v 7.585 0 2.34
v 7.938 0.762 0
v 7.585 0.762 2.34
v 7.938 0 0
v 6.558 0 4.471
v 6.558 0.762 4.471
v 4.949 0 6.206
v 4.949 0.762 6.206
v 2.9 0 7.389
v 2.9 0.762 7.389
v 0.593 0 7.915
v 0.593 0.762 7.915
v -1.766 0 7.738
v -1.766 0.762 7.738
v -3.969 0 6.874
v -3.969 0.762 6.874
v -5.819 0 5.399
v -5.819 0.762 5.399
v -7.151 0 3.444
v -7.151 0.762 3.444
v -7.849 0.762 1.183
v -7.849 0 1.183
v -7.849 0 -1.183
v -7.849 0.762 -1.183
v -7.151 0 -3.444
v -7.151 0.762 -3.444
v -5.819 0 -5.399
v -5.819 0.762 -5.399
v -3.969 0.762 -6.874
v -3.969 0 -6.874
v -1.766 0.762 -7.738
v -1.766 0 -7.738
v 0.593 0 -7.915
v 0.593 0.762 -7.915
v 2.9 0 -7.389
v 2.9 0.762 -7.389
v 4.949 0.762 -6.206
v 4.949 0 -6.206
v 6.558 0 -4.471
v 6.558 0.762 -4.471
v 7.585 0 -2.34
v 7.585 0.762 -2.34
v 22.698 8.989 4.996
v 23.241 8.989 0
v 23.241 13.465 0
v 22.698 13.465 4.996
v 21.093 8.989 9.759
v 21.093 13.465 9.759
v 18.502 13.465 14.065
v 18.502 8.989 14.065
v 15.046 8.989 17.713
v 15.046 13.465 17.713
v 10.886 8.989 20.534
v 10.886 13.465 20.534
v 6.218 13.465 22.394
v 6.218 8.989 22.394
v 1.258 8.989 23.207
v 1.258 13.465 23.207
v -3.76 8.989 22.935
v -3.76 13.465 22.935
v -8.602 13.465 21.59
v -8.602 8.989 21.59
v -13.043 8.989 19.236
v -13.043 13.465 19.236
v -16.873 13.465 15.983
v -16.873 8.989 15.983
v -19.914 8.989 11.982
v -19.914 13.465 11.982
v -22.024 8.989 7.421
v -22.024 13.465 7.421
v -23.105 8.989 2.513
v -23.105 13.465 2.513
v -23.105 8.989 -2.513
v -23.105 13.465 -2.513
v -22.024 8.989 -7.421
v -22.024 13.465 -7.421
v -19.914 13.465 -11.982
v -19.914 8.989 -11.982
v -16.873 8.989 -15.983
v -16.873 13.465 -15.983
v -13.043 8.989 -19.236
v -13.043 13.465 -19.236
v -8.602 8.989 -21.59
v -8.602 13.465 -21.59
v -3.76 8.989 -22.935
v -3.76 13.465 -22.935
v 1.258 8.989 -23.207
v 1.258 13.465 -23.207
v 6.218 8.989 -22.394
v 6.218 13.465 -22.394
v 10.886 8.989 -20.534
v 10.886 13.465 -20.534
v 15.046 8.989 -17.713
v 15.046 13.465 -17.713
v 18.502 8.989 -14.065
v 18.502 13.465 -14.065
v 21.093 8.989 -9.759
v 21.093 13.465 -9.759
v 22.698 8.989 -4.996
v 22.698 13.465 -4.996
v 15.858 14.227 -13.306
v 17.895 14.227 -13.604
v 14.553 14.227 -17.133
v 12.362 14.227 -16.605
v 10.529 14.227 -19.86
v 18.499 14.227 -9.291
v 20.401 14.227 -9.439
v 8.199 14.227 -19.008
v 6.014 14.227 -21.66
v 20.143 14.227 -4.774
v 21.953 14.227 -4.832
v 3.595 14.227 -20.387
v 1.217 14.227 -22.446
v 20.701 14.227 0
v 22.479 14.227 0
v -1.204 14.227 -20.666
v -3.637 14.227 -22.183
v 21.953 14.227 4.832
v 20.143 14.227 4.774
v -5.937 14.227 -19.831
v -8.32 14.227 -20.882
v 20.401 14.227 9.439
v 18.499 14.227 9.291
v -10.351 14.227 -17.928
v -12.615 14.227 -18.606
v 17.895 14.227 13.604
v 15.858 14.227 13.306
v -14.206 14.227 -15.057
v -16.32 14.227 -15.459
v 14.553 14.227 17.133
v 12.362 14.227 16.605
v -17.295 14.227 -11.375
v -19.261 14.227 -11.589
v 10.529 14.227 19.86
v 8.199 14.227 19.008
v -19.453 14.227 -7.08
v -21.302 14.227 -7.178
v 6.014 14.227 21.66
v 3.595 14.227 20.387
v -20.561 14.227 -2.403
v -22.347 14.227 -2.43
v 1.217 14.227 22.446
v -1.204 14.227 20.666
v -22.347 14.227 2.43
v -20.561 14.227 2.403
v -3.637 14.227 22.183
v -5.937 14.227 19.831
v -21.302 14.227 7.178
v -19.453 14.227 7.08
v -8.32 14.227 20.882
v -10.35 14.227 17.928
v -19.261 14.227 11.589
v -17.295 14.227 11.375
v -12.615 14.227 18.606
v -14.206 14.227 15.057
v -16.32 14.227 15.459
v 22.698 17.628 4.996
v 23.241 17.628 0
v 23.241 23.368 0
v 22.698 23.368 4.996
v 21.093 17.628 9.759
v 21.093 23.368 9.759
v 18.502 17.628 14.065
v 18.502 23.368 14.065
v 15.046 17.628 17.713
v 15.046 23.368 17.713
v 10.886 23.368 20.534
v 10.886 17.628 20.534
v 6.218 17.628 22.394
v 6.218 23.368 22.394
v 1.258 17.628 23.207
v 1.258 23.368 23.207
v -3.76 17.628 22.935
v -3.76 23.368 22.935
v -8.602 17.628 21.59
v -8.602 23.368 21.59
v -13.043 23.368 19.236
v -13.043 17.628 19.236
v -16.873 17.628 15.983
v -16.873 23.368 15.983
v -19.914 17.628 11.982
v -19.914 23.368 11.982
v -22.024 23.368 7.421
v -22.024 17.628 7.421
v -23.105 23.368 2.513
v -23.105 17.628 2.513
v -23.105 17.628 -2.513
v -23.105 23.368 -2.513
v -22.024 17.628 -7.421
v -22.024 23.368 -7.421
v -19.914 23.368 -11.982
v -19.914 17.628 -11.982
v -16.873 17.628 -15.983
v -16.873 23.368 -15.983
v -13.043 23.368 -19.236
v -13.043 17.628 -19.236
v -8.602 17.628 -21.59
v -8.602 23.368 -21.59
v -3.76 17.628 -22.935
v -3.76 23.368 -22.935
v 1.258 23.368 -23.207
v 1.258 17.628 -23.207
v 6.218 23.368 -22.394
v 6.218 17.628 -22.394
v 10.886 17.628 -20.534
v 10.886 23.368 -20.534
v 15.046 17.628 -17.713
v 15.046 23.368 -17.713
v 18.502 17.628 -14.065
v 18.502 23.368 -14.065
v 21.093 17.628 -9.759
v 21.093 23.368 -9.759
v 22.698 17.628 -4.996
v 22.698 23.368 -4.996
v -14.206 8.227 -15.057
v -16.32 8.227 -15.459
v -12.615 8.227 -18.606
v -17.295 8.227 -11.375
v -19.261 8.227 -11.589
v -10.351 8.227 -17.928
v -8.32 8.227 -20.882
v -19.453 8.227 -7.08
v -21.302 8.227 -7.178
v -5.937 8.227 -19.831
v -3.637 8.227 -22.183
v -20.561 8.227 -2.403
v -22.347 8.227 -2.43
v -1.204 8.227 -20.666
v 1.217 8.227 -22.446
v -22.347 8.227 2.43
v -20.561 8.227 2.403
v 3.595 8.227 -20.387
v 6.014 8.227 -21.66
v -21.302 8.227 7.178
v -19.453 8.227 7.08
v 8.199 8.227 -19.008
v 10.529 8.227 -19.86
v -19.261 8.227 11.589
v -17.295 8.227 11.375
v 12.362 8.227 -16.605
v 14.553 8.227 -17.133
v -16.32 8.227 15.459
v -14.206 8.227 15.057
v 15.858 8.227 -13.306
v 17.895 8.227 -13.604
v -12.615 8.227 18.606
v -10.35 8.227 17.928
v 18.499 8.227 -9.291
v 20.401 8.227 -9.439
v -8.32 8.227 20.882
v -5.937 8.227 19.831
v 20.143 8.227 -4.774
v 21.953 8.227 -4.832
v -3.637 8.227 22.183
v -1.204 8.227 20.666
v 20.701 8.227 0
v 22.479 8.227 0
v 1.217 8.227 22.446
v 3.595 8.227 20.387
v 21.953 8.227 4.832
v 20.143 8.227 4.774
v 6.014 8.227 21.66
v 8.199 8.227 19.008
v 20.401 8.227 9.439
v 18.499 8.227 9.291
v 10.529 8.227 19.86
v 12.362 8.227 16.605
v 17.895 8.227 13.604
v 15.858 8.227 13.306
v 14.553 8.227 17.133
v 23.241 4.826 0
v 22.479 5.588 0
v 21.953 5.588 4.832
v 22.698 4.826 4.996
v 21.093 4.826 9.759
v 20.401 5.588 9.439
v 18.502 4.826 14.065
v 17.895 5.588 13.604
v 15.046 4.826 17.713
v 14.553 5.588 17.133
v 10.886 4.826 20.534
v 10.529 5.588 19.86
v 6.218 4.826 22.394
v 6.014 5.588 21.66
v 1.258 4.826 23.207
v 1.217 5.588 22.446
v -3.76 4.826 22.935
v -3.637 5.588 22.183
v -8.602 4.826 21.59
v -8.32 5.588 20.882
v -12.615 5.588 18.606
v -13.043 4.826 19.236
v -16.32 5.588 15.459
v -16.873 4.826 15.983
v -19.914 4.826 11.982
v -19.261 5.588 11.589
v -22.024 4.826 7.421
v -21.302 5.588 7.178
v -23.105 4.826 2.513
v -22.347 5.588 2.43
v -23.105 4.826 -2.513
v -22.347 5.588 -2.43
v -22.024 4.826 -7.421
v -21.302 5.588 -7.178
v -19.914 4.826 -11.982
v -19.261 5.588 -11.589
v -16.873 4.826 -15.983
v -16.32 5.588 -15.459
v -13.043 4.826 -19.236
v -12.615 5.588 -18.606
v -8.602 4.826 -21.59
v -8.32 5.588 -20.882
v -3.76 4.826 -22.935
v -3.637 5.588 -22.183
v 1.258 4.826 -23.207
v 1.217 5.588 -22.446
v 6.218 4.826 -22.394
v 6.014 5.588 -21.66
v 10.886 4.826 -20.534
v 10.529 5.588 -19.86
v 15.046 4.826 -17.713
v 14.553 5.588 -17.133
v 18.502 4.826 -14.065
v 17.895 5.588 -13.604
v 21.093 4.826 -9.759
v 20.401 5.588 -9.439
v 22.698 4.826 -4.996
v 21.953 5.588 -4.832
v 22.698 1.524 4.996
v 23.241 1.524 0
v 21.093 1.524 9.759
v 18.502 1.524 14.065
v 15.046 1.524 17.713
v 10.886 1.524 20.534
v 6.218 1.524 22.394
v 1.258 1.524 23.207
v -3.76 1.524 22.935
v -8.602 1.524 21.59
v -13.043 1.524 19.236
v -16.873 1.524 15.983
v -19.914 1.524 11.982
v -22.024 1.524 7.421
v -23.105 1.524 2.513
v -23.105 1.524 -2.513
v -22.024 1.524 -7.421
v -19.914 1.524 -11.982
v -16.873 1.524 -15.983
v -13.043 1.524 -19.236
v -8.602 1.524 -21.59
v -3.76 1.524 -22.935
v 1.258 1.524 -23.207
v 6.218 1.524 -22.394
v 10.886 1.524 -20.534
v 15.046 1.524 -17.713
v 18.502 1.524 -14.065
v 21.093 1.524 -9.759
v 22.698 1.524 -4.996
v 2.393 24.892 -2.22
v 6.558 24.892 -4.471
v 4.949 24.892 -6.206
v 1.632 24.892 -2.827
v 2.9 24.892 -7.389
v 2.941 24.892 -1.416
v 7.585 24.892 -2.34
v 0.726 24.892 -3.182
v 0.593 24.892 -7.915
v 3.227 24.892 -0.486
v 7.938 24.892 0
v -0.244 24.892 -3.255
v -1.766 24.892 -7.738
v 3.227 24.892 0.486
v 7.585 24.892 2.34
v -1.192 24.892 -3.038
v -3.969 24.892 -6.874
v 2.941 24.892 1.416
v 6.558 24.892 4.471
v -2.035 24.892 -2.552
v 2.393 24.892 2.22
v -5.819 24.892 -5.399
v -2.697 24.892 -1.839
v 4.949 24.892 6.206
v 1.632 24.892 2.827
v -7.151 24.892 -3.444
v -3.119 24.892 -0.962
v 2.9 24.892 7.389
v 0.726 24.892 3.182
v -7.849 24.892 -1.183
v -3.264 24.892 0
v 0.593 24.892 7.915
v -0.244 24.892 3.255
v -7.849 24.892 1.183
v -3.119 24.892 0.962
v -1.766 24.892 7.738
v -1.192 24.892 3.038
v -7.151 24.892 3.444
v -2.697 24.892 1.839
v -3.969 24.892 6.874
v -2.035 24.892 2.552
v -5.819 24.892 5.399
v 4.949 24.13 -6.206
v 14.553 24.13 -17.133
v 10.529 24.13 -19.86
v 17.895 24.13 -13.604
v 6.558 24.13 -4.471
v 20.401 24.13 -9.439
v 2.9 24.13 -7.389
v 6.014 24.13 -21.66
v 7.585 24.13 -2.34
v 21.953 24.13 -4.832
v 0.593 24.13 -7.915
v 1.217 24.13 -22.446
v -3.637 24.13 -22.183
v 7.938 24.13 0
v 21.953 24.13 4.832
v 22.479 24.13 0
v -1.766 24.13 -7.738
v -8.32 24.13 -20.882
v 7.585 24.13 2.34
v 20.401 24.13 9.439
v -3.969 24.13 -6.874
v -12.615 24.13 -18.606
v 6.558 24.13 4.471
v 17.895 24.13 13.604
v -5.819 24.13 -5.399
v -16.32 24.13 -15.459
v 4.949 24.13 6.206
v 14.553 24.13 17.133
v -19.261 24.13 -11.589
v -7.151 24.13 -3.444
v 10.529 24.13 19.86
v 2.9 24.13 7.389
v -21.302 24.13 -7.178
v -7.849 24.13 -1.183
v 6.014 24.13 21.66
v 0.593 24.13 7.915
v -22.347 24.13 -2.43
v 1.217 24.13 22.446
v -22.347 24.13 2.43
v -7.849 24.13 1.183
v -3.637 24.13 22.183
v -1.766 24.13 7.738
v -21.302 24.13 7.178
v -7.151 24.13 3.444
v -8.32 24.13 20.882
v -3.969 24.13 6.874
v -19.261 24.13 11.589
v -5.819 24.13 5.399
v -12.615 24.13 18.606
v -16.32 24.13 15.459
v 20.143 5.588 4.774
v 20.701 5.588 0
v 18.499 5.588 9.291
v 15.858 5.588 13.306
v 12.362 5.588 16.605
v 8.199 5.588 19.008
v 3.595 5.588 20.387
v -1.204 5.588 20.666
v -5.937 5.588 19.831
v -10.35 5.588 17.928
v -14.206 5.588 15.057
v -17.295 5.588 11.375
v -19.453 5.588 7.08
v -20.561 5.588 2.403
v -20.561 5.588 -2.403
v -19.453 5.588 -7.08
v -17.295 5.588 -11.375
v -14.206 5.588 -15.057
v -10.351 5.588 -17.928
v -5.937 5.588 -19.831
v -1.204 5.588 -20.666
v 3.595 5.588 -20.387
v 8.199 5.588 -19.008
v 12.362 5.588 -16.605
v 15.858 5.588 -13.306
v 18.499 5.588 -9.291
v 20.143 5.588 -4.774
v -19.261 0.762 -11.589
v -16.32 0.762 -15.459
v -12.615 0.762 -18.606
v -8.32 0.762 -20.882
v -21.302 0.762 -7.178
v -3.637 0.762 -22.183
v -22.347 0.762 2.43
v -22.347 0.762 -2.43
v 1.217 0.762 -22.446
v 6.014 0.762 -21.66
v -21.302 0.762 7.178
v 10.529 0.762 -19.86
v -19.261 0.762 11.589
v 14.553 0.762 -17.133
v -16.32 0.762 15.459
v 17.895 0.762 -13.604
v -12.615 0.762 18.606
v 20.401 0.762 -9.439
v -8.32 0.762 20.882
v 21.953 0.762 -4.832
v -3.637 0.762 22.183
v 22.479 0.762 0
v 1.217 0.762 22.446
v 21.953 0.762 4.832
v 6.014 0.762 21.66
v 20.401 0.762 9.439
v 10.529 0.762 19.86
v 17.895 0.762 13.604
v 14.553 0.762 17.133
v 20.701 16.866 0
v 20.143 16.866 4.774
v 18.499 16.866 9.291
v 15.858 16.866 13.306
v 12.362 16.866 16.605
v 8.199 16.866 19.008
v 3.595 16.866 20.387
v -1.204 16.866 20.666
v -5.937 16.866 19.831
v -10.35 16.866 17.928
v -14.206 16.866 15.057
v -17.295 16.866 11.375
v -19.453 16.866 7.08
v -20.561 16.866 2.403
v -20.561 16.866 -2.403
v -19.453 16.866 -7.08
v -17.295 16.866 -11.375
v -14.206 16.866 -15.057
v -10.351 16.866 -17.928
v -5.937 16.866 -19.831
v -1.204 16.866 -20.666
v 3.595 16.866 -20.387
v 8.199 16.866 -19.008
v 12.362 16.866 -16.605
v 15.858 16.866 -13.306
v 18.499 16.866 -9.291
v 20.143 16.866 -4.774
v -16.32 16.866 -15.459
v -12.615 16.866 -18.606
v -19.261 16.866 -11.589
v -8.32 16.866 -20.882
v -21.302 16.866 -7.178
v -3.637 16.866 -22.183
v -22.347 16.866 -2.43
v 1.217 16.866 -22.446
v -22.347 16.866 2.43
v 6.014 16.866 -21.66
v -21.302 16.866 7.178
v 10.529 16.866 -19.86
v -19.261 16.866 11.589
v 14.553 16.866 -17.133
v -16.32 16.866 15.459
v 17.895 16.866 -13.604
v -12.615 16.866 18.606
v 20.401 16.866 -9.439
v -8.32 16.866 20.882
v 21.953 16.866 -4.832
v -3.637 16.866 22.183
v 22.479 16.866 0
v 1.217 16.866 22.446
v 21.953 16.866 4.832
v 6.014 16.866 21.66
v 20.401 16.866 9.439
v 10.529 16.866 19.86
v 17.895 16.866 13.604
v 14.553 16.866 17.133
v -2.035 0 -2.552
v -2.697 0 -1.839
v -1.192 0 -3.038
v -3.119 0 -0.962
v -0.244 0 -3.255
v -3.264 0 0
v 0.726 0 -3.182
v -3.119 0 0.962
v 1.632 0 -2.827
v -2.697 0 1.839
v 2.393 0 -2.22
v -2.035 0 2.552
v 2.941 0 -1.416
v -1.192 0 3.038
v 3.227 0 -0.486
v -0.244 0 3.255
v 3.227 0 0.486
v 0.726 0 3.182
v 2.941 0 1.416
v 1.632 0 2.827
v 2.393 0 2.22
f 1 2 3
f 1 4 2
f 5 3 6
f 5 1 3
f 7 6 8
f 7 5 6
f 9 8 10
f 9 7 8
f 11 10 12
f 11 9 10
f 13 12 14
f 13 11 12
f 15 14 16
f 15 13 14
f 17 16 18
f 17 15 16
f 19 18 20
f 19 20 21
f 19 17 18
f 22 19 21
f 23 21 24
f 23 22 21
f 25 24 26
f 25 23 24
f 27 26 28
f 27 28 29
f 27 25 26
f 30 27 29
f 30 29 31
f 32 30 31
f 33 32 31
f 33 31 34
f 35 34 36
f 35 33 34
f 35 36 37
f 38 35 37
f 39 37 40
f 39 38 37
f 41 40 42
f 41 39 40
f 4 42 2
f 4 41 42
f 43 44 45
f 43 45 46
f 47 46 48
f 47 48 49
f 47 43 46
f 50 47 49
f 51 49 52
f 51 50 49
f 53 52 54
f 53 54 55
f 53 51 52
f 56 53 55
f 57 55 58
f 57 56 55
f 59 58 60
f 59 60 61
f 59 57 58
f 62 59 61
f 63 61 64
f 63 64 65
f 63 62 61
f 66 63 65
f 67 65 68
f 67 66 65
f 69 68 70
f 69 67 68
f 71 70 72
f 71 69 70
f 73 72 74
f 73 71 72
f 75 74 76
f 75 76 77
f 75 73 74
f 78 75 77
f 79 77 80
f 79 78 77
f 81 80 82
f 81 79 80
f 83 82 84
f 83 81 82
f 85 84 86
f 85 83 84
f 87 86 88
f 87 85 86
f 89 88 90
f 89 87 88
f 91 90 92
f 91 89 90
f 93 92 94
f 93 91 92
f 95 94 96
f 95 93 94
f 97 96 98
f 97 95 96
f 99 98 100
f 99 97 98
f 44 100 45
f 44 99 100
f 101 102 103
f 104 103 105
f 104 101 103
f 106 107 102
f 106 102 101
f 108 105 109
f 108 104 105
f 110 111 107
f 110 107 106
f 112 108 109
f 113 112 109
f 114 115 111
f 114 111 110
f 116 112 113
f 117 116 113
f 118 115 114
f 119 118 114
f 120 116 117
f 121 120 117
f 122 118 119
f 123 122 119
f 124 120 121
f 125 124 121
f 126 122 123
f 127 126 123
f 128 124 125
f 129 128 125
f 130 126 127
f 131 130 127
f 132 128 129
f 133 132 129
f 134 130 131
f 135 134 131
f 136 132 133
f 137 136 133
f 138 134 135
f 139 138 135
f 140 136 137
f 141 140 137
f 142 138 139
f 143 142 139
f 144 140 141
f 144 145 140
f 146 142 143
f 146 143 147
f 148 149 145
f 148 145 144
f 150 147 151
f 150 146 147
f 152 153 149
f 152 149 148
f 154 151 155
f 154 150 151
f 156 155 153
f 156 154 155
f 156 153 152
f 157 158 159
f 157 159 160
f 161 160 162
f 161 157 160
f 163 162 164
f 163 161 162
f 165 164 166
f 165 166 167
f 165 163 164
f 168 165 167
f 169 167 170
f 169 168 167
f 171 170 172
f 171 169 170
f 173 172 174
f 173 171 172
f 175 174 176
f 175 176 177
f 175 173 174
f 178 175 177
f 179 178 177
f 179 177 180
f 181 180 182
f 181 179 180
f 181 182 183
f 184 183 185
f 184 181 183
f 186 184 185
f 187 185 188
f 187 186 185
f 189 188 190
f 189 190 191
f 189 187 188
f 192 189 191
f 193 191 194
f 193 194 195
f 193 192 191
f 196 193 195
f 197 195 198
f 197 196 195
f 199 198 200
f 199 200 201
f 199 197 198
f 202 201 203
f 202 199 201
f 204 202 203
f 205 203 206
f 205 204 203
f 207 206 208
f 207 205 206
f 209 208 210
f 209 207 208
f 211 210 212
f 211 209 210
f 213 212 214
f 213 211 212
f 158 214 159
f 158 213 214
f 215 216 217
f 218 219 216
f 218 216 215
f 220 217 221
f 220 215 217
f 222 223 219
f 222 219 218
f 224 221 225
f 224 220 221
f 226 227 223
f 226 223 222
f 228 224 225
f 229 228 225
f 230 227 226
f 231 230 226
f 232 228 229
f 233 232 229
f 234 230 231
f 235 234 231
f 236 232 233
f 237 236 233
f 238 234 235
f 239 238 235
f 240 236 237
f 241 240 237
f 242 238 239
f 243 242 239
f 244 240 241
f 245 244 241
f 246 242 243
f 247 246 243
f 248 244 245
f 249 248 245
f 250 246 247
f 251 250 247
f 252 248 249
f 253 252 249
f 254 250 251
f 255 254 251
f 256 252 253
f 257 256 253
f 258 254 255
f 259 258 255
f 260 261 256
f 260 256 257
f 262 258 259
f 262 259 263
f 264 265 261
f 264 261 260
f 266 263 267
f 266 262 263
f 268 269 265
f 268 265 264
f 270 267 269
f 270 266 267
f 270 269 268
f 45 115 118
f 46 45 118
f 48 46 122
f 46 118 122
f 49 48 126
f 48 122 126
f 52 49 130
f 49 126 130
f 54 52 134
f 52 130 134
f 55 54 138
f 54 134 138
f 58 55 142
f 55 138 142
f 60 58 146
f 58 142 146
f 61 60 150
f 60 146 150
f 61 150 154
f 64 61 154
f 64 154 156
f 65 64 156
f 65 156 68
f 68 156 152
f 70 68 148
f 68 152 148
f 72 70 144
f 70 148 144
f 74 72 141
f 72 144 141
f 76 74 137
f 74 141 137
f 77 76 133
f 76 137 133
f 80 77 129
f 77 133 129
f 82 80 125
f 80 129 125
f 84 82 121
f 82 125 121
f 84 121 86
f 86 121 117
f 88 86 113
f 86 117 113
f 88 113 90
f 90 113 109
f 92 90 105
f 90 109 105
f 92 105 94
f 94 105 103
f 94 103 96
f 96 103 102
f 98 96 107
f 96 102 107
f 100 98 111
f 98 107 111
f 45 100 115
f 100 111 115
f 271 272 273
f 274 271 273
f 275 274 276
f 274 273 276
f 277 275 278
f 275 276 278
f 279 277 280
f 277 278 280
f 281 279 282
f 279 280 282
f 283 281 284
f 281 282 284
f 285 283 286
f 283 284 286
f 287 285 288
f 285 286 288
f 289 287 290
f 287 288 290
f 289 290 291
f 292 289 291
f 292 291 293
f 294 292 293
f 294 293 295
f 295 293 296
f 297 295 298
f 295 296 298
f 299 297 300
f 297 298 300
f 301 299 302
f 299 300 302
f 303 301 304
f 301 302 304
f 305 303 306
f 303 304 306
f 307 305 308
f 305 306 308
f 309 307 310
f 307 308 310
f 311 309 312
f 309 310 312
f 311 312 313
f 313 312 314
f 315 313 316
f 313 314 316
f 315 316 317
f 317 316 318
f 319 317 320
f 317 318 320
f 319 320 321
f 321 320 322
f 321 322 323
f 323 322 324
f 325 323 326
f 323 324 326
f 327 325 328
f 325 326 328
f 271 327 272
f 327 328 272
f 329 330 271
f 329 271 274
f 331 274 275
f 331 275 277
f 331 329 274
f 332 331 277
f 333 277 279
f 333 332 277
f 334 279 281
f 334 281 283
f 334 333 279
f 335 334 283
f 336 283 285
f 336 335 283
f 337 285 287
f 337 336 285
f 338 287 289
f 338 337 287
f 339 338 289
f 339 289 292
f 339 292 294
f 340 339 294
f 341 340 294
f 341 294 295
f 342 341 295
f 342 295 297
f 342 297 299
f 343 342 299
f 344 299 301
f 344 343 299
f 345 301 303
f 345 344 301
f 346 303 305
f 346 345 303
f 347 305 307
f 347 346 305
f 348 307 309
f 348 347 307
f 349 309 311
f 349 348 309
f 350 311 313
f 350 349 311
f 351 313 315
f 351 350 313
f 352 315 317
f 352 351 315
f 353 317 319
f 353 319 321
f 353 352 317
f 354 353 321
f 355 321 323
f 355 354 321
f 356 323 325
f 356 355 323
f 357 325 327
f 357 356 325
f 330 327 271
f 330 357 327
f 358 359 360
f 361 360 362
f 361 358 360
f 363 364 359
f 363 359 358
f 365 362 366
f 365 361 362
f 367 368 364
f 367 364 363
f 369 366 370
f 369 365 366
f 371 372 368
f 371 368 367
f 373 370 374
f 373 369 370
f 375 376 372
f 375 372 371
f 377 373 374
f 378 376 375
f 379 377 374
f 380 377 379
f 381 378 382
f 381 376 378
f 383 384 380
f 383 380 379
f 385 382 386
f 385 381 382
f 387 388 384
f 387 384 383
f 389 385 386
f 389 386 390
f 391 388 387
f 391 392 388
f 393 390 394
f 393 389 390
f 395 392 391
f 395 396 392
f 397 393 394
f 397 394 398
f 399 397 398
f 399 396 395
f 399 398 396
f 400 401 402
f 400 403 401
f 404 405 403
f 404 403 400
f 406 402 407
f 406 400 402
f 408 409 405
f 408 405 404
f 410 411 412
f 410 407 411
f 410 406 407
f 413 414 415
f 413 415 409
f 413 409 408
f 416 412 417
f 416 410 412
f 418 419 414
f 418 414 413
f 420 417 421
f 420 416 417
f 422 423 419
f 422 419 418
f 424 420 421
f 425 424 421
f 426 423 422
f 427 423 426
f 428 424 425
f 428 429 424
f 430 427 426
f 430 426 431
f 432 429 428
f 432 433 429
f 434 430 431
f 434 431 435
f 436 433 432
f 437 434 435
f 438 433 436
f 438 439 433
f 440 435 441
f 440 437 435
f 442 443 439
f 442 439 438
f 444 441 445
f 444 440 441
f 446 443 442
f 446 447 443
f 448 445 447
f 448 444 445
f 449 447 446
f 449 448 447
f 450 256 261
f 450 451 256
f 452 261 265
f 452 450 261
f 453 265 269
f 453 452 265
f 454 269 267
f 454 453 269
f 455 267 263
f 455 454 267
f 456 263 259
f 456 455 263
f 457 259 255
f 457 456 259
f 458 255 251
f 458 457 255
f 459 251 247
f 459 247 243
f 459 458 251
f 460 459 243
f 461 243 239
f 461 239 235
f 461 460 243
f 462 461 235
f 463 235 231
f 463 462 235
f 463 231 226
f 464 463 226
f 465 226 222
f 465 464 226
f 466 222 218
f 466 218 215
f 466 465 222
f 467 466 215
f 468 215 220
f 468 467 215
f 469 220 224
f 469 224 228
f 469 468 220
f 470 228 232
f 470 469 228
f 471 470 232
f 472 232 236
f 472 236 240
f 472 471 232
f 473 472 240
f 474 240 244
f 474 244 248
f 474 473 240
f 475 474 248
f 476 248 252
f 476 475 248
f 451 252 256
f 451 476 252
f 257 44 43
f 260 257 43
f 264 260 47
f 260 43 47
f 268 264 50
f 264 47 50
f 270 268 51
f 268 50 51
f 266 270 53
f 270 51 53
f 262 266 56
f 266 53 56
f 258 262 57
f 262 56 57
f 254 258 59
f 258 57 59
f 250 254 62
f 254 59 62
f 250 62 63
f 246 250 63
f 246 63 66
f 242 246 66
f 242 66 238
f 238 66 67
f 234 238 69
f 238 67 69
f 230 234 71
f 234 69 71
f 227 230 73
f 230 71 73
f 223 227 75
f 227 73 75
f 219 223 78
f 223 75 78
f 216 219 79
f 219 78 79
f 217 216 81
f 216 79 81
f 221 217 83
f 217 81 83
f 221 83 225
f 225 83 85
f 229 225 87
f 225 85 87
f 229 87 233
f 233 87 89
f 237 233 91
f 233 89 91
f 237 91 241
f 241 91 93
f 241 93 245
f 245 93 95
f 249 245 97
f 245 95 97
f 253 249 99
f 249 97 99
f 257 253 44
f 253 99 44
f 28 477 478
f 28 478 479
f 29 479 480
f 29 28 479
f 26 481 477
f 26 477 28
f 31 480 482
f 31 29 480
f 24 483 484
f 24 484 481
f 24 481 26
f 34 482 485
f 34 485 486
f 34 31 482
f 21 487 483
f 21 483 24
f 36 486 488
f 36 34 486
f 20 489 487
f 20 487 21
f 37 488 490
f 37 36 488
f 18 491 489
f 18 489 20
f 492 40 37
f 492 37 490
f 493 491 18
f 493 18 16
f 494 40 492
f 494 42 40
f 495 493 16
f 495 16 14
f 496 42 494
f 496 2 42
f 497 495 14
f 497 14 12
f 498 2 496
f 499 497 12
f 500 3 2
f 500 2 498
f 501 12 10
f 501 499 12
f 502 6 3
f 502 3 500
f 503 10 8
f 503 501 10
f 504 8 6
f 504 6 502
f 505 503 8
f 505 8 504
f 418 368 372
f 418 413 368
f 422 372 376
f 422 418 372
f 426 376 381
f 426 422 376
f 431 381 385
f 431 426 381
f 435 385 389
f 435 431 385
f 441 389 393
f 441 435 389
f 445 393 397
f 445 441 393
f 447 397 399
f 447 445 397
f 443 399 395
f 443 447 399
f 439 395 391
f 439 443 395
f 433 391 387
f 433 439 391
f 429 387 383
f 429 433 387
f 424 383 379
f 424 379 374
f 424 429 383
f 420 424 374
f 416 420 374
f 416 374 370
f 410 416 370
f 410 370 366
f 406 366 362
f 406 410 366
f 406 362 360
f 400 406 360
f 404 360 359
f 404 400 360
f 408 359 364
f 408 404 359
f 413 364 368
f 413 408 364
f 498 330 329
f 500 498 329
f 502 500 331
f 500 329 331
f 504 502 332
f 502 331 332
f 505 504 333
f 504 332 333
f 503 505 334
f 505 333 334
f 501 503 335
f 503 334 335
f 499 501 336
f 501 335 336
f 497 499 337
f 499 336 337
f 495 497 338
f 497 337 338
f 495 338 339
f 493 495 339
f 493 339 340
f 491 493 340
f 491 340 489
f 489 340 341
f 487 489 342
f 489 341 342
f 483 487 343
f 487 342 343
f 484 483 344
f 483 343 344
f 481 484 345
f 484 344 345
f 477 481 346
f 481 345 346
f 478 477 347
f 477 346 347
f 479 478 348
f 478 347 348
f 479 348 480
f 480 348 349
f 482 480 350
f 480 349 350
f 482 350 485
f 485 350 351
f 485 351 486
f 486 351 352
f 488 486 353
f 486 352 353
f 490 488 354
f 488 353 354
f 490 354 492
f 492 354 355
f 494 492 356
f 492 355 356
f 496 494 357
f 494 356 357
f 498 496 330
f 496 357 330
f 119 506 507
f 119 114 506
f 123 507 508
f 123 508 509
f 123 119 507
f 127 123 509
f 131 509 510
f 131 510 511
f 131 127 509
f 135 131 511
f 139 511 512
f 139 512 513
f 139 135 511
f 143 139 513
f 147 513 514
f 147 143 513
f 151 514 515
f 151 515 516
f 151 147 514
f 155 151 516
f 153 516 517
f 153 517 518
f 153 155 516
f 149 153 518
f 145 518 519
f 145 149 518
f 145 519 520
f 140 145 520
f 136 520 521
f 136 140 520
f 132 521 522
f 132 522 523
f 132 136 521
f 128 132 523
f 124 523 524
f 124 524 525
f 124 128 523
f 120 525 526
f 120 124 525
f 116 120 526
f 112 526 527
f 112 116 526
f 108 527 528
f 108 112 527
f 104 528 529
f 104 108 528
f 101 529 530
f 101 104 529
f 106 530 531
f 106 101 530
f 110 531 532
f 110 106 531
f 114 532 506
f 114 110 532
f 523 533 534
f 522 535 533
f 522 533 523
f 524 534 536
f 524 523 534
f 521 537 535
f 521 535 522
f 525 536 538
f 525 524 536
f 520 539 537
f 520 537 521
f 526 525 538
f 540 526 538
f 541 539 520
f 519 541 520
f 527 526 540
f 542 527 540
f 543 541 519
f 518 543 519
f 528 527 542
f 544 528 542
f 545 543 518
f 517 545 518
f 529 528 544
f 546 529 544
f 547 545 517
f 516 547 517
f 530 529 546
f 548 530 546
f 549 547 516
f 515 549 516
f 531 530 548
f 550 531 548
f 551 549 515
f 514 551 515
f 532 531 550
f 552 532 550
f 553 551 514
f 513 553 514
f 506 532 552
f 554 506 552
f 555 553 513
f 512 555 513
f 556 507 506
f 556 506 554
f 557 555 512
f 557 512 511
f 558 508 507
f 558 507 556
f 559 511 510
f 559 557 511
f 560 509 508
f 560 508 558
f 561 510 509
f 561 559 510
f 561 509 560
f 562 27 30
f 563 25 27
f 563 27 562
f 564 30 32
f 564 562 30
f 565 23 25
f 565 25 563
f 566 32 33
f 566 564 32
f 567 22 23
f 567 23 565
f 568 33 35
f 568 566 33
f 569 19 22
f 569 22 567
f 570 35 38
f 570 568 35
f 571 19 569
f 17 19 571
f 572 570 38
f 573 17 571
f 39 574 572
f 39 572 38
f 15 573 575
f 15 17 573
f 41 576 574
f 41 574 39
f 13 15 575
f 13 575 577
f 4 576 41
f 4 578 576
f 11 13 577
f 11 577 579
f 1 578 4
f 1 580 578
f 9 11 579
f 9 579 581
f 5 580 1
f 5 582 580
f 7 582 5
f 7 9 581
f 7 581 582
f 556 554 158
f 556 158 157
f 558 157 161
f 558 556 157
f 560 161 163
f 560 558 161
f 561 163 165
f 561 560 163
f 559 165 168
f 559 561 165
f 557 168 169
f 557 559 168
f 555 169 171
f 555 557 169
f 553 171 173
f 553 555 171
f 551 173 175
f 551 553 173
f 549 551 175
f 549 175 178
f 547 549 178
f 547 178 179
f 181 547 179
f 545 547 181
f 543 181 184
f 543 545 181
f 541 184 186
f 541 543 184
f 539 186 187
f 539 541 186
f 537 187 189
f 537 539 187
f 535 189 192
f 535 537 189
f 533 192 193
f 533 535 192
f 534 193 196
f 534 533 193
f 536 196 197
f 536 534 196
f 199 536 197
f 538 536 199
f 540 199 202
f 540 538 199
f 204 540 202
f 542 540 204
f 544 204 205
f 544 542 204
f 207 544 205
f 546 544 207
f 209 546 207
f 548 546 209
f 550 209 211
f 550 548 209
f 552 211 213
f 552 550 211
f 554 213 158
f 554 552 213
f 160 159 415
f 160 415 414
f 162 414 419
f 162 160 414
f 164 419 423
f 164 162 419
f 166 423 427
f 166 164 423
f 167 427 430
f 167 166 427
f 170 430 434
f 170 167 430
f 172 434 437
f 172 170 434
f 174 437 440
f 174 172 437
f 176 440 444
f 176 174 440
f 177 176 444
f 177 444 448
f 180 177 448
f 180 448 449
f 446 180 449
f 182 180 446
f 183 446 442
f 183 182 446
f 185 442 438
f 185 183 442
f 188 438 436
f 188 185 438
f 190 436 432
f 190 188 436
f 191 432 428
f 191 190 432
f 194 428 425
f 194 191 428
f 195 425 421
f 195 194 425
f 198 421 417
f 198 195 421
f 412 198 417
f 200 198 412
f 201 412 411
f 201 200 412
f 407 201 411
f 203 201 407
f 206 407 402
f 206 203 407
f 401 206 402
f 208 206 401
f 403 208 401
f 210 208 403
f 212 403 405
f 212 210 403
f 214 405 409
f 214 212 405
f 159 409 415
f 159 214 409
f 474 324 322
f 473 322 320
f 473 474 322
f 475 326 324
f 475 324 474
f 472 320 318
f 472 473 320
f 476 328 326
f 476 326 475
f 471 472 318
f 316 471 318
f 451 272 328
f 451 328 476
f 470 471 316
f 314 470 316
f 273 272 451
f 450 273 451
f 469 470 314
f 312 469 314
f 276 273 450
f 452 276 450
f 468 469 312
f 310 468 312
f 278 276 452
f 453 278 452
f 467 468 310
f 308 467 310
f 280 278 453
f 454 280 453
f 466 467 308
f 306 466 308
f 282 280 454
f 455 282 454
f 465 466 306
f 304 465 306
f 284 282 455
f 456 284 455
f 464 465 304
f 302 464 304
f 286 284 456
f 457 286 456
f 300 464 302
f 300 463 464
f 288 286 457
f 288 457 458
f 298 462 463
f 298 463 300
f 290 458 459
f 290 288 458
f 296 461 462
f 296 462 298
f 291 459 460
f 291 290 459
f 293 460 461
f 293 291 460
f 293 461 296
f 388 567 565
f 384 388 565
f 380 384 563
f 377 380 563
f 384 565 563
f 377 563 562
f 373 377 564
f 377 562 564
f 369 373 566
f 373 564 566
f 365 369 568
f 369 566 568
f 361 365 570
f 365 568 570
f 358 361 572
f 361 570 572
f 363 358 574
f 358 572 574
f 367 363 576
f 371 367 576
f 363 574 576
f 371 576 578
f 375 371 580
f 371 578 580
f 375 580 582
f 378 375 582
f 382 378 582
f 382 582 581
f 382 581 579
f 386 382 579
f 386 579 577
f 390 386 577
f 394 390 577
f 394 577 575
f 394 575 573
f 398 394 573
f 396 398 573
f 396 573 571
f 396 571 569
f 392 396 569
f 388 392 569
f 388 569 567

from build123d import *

# Parameters (mm, degrees)
F_1_4_CLEARANCE_HOLE1_D = 6.5278
CHAMFER1_SIZE           = 0.762


with BuildPart() as part:
    # Sketch1 → Revolve1 (revolve)
    with BuildSketch(Plane.XY):
        Polygon((7.9375, 0.762), (7.9375, 0), (0, 0), (0, 24.892), (7.9375, 24.892), (7.9375, 24.13), (23.241, 24.13), (23.241, 16.8656), (20.701, 16.8656), (20.701, 14.226799969), (23.241, 14.226799969), (23.241, 8.226800031), (20.701, 8.226800031), (20.701, 5.588), (23.241, 5.588), (23.241, 0.762), align=None)
    revolve(axis=Axis((0, 24.892, 0), (0, -1, 0)))

    # 1/4 Clearance Hole1 (through all)
    with Locations(Plane(origin=(0, 24.892, 0), x_dir=(1, 0, 0), z_dir=(0, 1, 0))):
        with Locations((0, 0)):
            Hole(F_1_4_CLEARANCE_HOLE1_D / 2)

    # Chamfer1
    chamfer1_edges = [part.edges().sort_by_distance(p)[0] for p in [
        (-23.241, 24.13, 0),
        (-23.241, 16.8656, 0),
        (-23.241, 14.226799969, 0),
        (-23.241, 8.226800031, 0),
        (-23.241, 5.588, 0),
        (-23.241, 0.762, 0),
    ]]
    chamfer(chamfer1_edges, length=CHAMFER1_SIZE)


solid = part.part
